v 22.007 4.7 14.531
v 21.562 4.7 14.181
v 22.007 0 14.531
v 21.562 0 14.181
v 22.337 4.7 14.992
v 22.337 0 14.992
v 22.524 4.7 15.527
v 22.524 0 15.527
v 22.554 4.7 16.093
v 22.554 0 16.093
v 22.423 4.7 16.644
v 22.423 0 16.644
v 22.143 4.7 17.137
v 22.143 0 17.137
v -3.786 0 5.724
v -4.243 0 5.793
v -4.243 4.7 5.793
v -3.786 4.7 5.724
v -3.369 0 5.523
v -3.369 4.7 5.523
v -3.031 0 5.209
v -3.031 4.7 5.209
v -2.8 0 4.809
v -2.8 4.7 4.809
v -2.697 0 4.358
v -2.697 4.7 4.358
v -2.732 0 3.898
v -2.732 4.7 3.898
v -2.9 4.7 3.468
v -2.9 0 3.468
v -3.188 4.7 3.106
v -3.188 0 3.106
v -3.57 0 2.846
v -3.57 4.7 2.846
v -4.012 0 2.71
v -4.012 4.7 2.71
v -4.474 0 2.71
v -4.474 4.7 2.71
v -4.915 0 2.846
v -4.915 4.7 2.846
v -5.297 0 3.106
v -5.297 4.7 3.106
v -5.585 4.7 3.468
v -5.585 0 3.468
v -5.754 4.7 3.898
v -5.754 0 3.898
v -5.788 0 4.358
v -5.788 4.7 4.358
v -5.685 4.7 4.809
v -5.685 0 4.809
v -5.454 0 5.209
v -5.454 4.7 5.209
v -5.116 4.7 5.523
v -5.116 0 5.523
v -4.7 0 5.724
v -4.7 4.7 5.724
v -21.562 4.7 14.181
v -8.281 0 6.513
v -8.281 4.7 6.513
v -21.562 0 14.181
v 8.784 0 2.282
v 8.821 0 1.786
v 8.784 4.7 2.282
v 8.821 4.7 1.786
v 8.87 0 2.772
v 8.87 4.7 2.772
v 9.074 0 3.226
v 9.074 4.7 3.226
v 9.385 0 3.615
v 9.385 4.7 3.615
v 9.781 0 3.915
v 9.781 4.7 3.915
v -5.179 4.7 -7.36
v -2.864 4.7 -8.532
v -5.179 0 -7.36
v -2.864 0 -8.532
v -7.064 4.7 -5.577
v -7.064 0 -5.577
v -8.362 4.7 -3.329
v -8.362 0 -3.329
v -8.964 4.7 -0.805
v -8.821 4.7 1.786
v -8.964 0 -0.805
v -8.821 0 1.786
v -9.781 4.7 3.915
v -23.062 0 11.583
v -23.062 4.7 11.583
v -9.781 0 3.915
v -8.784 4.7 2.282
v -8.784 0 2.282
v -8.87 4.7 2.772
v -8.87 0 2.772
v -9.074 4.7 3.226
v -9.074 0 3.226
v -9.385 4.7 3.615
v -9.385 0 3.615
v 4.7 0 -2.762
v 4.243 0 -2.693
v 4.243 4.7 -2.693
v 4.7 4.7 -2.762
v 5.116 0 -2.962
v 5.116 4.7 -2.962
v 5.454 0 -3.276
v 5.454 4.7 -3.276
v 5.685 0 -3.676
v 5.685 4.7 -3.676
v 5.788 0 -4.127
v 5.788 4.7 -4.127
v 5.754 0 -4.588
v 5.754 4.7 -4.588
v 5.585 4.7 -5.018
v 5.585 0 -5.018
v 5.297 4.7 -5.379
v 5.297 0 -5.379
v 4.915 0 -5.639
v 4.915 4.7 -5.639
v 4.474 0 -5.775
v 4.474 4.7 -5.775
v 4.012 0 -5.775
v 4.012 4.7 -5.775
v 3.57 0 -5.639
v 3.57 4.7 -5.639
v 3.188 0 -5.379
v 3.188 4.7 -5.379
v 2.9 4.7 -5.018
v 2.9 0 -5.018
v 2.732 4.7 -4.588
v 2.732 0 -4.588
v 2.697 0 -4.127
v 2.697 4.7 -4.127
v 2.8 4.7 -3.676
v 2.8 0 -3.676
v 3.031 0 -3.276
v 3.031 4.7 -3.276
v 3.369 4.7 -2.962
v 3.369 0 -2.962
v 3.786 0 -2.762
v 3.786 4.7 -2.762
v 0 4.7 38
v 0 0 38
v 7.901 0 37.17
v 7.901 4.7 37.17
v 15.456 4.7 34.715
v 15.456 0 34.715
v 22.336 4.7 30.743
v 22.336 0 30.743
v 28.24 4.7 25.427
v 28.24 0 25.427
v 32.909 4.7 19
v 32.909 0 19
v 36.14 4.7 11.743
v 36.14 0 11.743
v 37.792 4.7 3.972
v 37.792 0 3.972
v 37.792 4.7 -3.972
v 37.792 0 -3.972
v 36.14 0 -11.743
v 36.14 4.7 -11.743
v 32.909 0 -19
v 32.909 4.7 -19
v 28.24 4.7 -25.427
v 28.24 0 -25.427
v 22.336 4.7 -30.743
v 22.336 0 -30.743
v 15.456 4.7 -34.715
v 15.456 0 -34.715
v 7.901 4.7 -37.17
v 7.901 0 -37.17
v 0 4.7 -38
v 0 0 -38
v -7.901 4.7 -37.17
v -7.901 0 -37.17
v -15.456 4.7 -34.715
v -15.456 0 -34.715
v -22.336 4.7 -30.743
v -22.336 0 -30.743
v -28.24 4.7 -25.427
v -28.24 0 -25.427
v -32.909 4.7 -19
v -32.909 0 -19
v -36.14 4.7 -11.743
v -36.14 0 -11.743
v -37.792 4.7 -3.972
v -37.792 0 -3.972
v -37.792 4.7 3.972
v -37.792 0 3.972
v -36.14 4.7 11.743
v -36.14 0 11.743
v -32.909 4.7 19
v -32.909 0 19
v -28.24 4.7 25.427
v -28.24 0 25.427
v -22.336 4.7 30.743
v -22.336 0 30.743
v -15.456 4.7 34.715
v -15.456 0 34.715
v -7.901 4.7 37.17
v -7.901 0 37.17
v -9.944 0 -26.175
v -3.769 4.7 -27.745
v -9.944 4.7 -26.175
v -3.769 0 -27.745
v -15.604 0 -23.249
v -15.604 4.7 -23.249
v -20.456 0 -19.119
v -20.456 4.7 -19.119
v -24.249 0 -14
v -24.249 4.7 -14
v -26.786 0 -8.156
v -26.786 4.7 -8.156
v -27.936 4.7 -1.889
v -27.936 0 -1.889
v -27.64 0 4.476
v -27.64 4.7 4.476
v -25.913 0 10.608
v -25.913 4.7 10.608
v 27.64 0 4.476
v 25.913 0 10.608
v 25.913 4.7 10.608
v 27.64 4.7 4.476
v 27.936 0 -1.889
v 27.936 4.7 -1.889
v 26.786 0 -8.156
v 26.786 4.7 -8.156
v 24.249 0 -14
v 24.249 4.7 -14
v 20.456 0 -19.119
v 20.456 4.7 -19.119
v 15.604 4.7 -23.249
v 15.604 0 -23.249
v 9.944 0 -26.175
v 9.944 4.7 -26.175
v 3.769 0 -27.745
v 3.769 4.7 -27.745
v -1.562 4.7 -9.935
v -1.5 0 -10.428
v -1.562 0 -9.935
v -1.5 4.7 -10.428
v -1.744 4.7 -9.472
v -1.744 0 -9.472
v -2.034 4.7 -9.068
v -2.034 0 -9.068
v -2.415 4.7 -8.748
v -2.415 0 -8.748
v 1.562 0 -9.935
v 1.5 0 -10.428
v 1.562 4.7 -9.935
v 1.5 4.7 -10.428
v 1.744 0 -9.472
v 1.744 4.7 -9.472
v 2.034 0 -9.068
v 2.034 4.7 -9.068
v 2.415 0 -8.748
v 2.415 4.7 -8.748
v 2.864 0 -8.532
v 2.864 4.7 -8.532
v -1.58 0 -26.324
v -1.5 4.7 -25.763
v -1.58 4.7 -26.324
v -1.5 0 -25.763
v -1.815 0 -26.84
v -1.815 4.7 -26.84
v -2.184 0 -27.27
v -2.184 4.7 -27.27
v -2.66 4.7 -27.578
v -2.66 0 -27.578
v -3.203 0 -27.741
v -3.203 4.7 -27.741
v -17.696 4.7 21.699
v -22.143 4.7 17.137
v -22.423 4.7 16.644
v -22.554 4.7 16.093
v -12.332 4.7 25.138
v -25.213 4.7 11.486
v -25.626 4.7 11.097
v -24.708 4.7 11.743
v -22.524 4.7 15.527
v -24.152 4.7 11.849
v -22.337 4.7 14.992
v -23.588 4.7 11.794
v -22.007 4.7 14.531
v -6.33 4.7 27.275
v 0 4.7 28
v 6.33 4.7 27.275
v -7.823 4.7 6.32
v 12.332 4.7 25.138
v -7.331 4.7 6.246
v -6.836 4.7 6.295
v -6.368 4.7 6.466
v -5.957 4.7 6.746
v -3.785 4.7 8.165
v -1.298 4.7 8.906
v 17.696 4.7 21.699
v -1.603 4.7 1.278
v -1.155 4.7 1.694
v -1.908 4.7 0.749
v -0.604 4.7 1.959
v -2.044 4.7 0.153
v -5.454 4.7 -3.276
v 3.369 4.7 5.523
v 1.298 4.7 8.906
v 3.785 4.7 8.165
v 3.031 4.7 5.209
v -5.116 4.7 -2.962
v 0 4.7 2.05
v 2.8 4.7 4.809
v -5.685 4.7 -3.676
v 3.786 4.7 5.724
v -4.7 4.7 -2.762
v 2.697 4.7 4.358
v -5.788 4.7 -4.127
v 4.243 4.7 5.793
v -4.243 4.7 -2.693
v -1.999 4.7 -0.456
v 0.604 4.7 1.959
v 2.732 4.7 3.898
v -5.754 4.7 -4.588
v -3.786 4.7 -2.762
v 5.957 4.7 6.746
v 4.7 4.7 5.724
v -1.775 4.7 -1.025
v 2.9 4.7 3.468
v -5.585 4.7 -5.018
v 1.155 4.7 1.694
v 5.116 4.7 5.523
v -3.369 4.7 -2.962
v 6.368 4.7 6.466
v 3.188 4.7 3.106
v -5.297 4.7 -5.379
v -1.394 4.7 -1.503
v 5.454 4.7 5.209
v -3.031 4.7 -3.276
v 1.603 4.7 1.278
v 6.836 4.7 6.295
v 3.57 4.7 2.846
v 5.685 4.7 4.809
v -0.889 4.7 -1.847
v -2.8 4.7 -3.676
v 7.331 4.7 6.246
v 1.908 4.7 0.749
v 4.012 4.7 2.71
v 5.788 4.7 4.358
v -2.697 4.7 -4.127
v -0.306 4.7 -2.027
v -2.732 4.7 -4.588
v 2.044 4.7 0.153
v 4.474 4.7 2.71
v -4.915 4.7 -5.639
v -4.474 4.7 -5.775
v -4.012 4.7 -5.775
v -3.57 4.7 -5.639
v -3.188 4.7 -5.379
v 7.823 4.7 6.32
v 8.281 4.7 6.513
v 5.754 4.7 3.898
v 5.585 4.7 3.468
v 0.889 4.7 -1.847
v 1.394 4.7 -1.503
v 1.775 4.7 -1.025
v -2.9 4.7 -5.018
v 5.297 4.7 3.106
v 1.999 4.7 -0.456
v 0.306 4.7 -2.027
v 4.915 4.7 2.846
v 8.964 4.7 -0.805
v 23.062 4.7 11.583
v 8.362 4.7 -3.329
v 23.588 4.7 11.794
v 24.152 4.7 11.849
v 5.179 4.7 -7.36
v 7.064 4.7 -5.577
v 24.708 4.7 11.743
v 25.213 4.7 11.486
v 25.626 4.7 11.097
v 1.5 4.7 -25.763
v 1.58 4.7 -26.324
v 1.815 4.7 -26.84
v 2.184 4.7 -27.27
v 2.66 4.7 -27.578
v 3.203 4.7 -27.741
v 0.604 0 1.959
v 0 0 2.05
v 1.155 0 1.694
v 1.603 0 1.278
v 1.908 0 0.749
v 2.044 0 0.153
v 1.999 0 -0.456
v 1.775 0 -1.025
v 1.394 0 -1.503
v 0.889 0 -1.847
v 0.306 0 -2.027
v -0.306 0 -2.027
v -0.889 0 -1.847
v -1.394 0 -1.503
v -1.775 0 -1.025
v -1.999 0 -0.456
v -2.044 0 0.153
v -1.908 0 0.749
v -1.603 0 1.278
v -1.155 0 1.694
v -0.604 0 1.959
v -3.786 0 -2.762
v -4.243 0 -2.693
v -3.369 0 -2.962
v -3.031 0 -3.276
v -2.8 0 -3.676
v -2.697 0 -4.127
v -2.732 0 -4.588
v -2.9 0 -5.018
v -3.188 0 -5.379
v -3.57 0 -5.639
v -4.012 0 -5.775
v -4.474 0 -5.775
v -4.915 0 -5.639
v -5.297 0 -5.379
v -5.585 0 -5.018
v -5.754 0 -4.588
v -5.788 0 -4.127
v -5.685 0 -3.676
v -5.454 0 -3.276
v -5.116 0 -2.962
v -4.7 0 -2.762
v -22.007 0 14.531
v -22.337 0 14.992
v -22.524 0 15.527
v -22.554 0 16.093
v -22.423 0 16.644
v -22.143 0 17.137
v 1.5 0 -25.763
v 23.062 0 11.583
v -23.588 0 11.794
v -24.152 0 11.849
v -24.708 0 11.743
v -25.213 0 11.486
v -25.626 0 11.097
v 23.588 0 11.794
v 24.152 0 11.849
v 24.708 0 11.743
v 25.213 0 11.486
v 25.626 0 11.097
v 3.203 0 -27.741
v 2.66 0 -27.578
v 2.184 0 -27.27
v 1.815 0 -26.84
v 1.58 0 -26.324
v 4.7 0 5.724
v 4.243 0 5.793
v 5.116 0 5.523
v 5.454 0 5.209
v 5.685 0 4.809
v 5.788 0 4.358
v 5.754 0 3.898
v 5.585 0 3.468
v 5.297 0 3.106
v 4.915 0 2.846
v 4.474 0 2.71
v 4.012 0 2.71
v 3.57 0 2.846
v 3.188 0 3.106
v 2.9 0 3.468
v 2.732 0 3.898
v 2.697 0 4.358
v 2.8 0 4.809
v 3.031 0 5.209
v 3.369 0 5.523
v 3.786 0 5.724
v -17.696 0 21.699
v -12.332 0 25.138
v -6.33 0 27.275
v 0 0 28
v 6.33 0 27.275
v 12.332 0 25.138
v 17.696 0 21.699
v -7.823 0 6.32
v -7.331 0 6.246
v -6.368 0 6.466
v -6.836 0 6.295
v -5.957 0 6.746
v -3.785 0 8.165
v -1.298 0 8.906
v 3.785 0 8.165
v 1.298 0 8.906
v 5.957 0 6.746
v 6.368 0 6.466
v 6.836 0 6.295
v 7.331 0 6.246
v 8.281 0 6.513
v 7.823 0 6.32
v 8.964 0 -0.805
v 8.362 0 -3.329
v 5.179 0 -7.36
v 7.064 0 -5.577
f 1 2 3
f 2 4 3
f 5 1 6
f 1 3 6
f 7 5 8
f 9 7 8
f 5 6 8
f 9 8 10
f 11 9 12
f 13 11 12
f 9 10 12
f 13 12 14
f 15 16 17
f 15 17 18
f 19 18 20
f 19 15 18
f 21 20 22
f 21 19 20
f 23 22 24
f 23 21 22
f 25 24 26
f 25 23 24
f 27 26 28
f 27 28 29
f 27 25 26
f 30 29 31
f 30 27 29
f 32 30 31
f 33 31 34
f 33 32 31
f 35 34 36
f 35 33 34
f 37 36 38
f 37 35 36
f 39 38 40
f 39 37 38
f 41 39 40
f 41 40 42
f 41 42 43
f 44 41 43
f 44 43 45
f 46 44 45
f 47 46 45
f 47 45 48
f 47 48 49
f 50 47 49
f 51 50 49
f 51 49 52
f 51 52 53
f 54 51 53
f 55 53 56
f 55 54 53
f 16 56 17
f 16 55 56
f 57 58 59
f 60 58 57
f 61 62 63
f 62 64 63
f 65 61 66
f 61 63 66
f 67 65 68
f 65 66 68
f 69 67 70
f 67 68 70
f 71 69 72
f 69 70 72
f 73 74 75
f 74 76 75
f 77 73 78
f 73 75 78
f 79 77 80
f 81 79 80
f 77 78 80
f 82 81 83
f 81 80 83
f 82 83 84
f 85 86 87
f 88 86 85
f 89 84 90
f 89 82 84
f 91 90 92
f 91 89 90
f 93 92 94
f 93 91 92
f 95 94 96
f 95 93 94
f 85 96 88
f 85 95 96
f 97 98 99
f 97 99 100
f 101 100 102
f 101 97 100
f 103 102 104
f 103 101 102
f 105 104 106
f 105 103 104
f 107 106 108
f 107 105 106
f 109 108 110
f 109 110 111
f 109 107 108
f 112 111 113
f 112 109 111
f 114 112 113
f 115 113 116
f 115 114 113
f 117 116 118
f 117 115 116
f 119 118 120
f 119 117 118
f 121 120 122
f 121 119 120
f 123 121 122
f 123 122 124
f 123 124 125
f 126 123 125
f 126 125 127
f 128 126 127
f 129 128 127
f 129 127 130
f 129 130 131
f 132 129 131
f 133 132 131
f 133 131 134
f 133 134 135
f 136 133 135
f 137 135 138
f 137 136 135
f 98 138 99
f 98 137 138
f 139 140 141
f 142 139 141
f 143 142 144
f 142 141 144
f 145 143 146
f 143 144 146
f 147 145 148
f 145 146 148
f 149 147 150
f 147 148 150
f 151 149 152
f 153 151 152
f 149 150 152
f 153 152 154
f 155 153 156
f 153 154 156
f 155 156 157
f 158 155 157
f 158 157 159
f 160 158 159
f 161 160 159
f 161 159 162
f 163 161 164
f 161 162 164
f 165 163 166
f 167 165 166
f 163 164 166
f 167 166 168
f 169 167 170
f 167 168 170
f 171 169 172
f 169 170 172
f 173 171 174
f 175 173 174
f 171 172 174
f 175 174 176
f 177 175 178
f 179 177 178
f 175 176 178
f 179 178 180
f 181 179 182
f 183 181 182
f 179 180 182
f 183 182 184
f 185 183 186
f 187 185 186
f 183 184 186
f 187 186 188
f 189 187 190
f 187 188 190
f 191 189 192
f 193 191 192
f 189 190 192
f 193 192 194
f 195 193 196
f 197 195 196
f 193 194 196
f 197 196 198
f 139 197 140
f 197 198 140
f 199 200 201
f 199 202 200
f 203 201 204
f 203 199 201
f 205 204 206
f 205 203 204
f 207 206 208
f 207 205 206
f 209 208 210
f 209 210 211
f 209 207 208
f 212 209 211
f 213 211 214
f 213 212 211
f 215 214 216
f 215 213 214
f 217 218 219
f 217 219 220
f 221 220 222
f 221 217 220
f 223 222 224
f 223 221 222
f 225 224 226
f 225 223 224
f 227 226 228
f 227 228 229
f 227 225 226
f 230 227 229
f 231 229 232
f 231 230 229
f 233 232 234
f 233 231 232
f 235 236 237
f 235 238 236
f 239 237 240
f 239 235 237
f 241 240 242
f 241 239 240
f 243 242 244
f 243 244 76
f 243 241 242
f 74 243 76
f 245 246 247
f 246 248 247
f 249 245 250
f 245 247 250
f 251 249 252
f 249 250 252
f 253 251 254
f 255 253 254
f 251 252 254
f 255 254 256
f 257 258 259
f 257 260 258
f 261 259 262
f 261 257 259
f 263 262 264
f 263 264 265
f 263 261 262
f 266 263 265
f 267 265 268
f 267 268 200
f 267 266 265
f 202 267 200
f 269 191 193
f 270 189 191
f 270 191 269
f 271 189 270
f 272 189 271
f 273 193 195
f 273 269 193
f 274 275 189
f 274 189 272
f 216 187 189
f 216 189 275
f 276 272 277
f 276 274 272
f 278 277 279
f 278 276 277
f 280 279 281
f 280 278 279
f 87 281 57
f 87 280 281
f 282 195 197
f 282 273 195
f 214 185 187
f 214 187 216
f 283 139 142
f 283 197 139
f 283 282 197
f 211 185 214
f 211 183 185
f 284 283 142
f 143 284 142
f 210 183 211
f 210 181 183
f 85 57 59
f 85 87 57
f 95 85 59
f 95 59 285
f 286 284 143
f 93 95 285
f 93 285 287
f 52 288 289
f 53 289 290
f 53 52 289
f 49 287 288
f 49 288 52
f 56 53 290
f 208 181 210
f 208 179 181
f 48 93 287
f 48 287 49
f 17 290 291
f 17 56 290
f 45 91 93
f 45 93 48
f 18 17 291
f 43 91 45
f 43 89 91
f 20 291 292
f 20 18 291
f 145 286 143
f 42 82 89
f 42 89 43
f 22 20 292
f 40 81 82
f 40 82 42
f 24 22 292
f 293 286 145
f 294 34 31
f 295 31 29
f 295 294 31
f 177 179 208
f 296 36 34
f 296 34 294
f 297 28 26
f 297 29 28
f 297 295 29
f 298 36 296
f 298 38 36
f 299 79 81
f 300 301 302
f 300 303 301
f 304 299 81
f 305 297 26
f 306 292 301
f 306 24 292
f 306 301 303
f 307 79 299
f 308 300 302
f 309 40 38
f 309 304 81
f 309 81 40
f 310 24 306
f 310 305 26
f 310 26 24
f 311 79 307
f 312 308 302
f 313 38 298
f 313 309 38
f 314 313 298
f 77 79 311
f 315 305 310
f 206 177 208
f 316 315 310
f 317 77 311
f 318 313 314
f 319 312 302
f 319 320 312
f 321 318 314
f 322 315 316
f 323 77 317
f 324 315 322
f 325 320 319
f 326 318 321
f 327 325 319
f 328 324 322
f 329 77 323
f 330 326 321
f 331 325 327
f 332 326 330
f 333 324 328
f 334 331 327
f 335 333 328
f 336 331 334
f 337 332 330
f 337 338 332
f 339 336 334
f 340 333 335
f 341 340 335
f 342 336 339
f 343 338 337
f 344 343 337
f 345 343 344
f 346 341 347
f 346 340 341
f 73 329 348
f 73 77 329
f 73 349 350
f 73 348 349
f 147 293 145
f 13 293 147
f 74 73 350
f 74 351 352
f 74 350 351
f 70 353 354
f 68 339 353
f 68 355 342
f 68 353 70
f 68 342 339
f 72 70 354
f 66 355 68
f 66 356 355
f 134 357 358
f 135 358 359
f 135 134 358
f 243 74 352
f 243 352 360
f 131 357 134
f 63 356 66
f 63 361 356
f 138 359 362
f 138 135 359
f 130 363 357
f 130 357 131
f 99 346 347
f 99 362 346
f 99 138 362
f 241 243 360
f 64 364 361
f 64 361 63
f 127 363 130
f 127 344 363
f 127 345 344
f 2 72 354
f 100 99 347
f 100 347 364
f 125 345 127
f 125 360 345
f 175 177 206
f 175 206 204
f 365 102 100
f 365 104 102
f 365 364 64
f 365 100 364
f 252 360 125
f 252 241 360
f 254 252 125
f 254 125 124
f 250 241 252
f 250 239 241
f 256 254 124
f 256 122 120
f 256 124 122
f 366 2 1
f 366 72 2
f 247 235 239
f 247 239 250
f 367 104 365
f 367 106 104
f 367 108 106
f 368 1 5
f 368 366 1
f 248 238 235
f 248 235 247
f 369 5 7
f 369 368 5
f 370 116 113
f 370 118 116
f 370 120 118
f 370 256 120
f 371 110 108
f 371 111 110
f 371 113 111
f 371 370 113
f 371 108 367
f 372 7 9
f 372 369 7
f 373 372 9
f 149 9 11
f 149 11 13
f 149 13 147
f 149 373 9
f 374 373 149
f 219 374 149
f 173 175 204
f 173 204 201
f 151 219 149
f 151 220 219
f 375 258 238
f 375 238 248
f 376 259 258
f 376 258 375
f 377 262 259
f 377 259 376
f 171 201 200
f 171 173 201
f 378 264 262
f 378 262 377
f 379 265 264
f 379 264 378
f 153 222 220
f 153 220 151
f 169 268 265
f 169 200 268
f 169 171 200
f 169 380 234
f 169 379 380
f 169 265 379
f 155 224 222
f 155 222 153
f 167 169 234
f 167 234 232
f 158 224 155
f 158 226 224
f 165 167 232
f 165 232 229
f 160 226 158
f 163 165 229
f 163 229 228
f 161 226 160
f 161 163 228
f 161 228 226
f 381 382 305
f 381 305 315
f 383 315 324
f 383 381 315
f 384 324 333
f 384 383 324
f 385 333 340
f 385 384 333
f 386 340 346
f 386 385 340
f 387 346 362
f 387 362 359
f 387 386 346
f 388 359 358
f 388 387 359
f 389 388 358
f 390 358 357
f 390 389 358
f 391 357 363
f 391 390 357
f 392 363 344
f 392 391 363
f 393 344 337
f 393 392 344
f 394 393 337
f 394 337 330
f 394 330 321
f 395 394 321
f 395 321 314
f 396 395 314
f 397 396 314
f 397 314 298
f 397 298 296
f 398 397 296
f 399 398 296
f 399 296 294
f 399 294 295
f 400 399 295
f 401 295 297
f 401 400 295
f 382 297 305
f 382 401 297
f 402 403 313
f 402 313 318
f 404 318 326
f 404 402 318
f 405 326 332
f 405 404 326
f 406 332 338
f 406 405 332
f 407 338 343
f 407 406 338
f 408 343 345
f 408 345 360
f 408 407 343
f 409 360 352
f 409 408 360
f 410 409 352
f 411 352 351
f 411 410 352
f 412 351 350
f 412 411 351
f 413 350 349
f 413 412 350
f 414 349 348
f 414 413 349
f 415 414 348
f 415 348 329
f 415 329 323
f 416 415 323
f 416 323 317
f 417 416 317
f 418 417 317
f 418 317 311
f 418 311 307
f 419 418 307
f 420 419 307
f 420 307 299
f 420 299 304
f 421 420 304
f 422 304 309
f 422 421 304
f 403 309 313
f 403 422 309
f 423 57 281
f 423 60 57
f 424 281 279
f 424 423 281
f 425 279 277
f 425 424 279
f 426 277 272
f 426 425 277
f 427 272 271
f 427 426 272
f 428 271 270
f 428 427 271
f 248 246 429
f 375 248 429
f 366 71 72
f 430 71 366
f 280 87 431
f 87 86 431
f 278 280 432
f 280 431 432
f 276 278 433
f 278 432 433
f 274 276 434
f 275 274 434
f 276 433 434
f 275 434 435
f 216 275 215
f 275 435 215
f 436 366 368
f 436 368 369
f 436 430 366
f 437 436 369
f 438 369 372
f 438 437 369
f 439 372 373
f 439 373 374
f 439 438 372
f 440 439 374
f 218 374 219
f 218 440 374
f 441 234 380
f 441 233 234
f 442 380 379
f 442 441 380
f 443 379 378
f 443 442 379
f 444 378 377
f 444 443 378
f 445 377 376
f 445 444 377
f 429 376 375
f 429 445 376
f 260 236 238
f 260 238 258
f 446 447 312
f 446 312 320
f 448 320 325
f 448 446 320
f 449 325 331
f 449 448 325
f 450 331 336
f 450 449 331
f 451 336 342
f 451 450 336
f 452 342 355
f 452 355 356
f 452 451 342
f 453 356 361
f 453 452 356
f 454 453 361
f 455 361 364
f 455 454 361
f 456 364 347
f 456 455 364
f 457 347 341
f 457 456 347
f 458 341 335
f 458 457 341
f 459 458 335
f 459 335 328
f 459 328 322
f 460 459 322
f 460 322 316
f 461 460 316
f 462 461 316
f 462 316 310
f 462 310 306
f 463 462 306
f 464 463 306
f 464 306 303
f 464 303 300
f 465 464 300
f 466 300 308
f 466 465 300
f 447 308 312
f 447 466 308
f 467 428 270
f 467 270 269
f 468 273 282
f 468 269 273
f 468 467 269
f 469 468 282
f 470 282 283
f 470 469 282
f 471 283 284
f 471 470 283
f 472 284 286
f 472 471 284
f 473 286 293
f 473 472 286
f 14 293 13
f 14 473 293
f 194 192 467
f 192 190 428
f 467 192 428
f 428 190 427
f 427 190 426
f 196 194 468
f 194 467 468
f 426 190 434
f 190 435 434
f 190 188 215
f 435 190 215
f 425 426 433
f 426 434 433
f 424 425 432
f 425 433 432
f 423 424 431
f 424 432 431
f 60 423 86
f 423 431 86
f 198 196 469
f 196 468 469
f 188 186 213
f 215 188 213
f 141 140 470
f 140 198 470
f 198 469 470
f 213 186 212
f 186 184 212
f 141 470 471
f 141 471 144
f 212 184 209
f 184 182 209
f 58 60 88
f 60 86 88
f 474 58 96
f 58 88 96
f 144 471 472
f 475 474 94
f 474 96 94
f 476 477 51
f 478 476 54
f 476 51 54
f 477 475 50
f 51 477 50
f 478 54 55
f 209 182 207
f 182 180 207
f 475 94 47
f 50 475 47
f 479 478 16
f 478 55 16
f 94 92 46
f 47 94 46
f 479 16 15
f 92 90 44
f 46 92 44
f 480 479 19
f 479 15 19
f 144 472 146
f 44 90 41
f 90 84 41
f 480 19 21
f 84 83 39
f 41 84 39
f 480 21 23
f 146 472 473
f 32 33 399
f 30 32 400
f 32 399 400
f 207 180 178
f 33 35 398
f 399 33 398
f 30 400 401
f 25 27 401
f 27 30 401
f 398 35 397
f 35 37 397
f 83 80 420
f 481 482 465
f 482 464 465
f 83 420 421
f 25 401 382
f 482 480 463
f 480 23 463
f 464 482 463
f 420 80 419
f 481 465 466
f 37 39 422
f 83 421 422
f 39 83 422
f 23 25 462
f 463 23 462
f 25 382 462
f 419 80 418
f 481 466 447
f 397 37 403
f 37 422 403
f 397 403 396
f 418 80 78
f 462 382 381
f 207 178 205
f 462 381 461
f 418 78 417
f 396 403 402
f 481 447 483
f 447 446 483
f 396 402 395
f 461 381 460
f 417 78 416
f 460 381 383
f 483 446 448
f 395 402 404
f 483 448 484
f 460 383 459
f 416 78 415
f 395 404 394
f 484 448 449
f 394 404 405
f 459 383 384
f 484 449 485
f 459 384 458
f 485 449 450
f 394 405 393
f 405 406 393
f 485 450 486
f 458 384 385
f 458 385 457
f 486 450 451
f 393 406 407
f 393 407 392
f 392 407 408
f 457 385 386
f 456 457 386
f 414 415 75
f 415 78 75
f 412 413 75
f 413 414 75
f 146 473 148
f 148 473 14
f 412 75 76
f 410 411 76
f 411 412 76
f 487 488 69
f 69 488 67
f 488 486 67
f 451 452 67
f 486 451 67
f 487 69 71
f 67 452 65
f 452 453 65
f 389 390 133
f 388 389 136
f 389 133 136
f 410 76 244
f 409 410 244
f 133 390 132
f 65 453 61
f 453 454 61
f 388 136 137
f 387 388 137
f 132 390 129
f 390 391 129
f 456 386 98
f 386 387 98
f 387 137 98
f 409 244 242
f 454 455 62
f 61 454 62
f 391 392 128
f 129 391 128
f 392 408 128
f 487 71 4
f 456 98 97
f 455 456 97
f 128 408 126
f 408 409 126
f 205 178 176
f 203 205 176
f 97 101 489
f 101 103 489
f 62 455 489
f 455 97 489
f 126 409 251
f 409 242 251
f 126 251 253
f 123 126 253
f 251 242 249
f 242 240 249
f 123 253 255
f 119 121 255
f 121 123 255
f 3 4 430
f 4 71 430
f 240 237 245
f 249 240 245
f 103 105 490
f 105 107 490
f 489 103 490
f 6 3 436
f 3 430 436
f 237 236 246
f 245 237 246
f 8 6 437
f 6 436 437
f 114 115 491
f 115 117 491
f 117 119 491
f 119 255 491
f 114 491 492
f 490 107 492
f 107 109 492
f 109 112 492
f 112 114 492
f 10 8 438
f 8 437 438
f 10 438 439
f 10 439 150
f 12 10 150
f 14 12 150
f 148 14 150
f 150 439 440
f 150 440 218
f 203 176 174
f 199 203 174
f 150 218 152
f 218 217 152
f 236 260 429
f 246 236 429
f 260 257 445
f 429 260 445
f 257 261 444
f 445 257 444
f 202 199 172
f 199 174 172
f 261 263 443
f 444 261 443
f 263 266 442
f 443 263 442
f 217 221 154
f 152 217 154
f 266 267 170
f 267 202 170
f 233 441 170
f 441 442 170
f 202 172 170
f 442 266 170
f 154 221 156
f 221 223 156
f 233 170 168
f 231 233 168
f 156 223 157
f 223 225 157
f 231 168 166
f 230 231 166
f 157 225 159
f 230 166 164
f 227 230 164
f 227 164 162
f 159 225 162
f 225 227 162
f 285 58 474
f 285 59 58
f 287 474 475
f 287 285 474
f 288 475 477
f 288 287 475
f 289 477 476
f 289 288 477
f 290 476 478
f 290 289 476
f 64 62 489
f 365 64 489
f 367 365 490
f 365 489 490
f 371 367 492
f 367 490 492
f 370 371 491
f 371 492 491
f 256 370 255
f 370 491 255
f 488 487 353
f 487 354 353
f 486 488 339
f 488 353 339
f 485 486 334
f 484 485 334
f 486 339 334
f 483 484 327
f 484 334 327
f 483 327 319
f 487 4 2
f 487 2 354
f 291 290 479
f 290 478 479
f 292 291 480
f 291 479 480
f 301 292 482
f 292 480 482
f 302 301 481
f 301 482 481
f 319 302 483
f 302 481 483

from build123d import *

# Parameters (mm, degrees)
SKETCH1_R           = 38
SKETCH1_R_2         = 28
BOSS_EXTRUDE1_DEPTH = 4.7
SKETCH2_R           = 9
SKETCH2_R_2         = 2.05
SKETCH2_R_3         = 1.55
BOSS_EXTRUDE2_DEPTH = 4.7
SKETCH3_W           = 3
SKETCH3_H           = 20.125880325
BOSS_EXTRUDE3_DEPTH = 4.7
FILLET1_R           = 2
FILLET2_R           = 2


with BuildPart() as part:
    # Sketch1 → Boss-Extrude1 (new body)
    with BuildSketch(Plane(origin=(0, 0, 0), x_dir=(1, 0, 0), z_dir=(0, 1, 0))):
        with Locations(Location((0, 0, 0), (0, 0, 270))):
            Circle(SKETCH1_R)
        with Locations(Location((0, 0, 0), (0, 0, 270))):
            Circle(SKETCH1_R_2, mode=Mode.SUBTRACT)
    extrude(amount=BOSS_EXTRUDE1_DEPTH)



with BuildPart() as body_2:
    # Sketch2 → Boss-Extrude2 (new body)
    with BuildSketch(Plane(origin=(0, 0, 0), x_dir=(1, 0, 0), z_dir=(0, 1, 0))):
        with Locations(Location((0, 0, 0), (0, 0, 270))):
            Circle(SKETCH2_R)
        with Locations(Location((0, 0, 0), (0, 0, 270))):
            Circle(SKETCH2_R_2, mode=Mode.SUBTRACT)
        with Locations(Location((-4.242640687, 4.242640687, 0), (0, 0, 270))):
            Circle(SKETCH2_R_3, mode=Mode.SUBTRACT)
        with Locations(Location((-4.242640687, -4.242640687, 0), (0, 0, 270))):
            Circle(SKETCH2_R_3, mode=Mode.SUBTRACT)
        with Locations(Location((4.242640687, -4.242640687, 0), (0, 0, 270))):
            Circle(SKETCH2_R_3, mode=Mode.SUBTRACT)
        with Locations(Location((4.242640687, 4.242640687, 0), (0, 0, 270))):
            Circle(SKETCH2_R_3, mode=Mode.SUBTRACT)
    extrude(amount=BOSS_EXTRUDE2_DEPTH)


with BuildPart() as part_1:
    add(part.part)

    add(body_2.part)  # Boss-Extrude3 merges body 2
    # Sketch3 → Boss-Extrude3 (add)
    with BuildSketch(Plane(origin=(0, 0, 0), x_dir=(1, 0, 0), z_dir=(0, 1, 0))):
        with Locations((0, 18.937059838)):
            Rectangle(SKETCH3_W, SKETCH3_H)
        Polygon((25.86473671, -13.200961894), (24.36473671, -15.799038106), (6.935213074, -5.736097943), (8.435213074, -3.138021732), align=None)
        Polygon((-24.36473671, -15.799038106), (-25.86473671, -13.200961894), (-8.435213074, -3.138021732), (-6.935213074, -5.736097943), align=None)
    extrude(amount=BOSS_EXTRUDE3_DEPTH)

    # Fillet1
    fillet1_edges = [part_1.edges().sort_by_distance(p)[0] for p in [
        (1.5, 2.35, -27.95979256),
        (-1.5, 2.35, -27.95979256),
        (24.963890642, 2.35, 12.680858174),
        (23.463890642, 2.35, 15.278934386),
        (-23.463890642, 2.35, 15.278934386),
        (-24.963890642, 2.35, 12.680858174),
    ]]
    fillet(fillet1_edges, radius=FILLET1_R)

    # Fillet2
    fillet2_edges = [part_1.edges().sort_by_distance(p)[0] for p in [
        (-1.5, 2.35, -8.874119675),
        (1.5, 2.35, -8.874119675),
        (8.435213074, 2.35, 3.138021732),
        (6.935213074, 2.35, 5.736097943),
        (-6.935213074, 2.35, 5.736097943),
        (-8.435213074, 2.35, 3.138021732),
    ]]
    fillet(fillet2_edges, radius=FILLET2_R)


solid = part_1.part
